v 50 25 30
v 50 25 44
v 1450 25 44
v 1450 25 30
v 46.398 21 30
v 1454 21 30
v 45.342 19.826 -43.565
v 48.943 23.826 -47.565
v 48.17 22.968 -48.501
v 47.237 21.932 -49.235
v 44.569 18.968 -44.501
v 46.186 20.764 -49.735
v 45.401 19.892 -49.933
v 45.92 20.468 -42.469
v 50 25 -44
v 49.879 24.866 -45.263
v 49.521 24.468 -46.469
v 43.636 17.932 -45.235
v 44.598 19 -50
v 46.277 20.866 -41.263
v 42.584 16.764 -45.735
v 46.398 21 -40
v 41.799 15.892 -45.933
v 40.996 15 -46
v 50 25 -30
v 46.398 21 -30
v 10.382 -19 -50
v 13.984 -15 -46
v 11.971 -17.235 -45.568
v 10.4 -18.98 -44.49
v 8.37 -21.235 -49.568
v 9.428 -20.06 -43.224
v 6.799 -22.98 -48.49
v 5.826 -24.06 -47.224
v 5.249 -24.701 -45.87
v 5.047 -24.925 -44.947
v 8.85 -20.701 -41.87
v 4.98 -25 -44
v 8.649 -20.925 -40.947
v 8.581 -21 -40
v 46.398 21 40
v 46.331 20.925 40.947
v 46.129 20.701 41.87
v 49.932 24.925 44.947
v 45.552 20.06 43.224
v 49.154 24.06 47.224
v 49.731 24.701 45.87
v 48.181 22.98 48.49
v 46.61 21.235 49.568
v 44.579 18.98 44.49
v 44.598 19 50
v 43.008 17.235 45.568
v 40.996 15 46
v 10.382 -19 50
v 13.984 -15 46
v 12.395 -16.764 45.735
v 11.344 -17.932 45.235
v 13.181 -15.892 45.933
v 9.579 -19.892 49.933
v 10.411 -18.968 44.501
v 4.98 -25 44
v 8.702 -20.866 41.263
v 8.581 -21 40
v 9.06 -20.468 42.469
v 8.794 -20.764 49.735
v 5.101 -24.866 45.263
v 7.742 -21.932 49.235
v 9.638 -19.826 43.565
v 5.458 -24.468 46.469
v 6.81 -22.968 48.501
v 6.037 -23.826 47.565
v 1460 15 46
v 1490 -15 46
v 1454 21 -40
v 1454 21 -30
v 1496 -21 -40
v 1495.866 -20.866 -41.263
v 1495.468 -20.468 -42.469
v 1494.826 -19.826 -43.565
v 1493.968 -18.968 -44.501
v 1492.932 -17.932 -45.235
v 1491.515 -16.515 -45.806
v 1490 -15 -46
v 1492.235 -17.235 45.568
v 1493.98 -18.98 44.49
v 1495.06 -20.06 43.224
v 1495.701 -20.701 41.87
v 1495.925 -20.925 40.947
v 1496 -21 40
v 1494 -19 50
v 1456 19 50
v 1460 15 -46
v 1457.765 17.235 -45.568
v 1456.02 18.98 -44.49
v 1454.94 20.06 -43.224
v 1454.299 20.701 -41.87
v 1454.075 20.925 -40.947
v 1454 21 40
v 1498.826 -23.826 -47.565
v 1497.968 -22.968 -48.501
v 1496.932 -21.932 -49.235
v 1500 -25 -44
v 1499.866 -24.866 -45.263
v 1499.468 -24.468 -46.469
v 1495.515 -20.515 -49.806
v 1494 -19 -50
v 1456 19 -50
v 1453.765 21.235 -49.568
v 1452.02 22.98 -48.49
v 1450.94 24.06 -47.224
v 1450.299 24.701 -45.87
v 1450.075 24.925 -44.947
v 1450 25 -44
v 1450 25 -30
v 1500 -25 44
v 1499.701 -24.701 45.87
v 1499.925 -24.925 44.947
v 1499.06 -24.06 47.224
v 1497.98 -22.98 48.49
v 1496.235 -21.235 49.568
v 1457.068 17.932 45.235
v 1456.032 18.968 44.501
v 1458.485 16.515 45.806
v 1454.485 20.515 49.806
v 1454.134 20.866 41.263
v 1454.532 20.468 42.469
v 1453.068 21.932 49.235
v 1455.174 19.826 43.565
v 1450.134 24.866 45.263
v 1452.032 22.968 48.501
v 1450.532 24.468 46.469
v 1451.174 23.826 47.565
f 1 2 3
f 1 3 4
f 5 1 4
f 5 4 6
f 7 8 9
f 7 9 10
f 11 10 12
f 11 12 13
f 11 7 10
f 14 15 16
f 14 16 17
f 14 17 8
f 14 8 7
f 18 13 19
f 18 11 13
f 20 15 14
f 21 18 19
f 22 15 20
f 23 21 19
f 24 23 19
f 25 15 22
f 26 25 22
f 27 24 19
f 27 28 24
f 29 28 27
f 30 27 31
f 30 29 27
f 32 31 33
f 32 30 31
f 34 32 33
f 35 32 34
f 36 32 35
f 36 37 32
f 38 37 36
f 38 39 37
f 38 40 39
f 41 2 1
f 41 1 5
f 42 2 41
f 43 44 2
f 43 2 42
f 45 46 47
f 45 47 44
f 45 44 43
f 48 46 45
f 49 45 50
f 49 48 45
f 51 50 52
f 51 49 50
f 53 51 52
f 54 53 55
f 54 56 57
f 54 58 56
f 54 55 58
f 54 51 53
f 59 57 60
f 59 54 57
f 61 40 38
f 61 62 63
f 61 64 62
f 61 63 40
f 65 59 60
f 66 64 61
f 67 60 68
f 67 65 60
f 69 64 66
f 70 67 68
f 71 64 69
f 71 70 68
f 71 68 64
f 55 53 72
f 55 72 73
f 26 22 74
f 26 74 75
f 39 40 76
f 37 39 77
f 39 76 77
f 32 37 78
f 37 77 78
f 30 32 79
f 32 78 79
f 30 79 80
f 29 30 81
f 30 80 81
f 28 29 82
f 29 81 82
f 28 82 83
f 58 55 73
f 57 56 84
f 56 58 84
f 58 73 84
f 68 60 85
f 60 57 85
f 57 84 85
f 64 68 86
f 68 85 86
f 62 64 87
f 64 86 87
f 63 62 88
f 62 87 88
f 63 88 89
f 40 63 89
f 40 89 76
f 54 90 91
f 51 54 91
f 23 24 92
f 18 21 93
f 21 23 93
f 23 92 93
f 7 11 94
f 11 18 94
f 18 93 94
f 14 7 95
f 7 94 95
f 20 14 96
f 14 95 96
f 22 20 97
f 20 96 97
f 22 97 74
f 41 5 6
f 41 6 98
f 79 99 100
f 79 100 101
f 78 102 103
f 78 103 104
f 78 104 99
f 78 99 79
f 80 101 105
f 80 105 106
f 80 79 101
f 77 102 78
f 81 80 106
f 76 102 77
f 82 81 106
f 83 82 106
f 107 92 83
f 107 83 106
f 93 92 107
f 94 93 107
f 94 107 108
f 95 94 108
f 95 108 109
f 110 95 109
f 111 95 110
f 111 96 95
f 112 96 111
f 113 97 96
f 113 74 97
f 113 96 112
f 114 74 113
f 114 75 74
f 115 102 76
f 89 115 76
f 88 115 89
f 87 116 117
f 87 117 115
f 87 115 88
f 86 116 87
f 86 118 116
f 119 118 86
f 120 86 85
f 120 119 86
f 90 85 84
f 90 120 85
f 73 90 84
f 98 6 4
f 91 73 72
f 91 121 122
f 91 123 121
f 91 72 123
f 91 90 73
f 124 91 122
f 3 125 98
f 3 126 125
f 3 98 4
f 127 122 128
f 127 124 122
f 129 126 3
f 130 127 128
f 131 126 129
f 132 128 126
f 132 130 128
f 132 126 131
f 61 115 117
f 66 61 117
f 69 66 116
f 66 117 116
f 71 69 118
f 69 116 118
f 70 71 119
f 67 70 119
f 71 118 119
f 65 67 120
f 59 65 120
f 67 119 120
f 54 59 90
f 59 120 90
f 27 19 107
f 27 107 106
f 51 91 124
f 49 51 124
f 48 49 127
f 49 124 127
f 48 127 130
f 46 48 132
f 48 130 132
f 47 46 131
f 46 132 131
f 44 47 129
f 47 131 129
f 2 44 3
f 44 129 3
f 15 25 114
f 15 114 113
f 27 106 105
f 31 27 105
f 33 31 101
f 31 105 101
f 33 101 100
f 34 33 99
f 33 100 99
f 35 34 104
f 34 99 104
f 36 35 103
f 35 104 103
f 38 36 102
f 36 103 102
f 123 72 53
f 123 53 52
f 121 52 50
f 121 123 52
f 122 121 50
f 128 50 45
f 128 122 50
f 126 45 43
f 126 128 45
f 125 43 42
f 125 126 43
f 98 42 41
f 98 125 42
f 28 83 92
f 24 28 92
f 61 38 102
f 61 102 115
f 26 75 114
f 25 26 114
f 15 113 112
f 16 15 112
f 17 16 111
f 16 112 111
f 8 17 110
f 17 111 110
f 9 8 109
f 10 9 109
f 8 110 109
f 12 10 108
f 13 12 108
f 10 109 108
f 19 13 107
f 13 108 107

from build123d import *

# Parameters (mm, degrees)
RESSALTO_EXTRUS_O1_DEPTH = 1500
FILETE1_R                = 6
CORTE_EXTRUS_O1_DEPTH    = 50
CORTE_EXTRUS_O2_DEPTH    = 50


with BuildPart() as part:
    # Esboço1 → Ressalto-extrusão1 (new body)
    with BuildSketch(Plane(origin=(0, 0, 0), x_dir=(0, 0, -1), z_dir=(1, 0, 0))):
        Polygon((-46, 21), (-46, -21), (46, -21), (46, 21), (30, 21), (30, 25), (50, 25), (50, -25), (-50, -25), (-50, 25), (-30, 25), (-30, 21), align=None)
    extrude(amount=RESSALTO_EXTRUS_O1_DEPTH)

    # Filete1
    filete1_edges = [part.edges().sort_by_distance(p)[0] for p in [
        (750, -25, -50),
        (750, -25, 50),
        (750, 25, 50),
        (750, 21, 46),
        (750, -21, 46),
        (750, -21, -46),
        (750, 21, -46),
        (750, 25, -50),
    ]]
    fillet(filete1_edges, radius=FILETE1_R)

    # Esboço3 → Corte-extrusão1 (cut, symmetric)
    with BuildSketch(Plane.XY):
        Polygon((0, -25), (184.767559257, 159.767559257), (-208.615442636, 104.939092506), align=None)
        Polygon((1500, -25), (1327.707280818, 147.292719182), (1799.383443157, 147.292719182), align=None)
    extrude(amount=CORTE_EXTRUS_O1_DEPTH, both=True, mode=Mode.SUBTRACT)

    # Esboço4 → Corte-extrusão2 (cut, symmetric)
    with BuildSketch(Plane.XY):
        Polygon((50, 25), (-16.235639867, -48.562130564), (-42.129730134, -17.715767118), align=None)
    extrude(amount=CORTE_EXTRUS_O2_DEPTH, both=True, mode=Mode.SUBTRACT)


solid = part.part
